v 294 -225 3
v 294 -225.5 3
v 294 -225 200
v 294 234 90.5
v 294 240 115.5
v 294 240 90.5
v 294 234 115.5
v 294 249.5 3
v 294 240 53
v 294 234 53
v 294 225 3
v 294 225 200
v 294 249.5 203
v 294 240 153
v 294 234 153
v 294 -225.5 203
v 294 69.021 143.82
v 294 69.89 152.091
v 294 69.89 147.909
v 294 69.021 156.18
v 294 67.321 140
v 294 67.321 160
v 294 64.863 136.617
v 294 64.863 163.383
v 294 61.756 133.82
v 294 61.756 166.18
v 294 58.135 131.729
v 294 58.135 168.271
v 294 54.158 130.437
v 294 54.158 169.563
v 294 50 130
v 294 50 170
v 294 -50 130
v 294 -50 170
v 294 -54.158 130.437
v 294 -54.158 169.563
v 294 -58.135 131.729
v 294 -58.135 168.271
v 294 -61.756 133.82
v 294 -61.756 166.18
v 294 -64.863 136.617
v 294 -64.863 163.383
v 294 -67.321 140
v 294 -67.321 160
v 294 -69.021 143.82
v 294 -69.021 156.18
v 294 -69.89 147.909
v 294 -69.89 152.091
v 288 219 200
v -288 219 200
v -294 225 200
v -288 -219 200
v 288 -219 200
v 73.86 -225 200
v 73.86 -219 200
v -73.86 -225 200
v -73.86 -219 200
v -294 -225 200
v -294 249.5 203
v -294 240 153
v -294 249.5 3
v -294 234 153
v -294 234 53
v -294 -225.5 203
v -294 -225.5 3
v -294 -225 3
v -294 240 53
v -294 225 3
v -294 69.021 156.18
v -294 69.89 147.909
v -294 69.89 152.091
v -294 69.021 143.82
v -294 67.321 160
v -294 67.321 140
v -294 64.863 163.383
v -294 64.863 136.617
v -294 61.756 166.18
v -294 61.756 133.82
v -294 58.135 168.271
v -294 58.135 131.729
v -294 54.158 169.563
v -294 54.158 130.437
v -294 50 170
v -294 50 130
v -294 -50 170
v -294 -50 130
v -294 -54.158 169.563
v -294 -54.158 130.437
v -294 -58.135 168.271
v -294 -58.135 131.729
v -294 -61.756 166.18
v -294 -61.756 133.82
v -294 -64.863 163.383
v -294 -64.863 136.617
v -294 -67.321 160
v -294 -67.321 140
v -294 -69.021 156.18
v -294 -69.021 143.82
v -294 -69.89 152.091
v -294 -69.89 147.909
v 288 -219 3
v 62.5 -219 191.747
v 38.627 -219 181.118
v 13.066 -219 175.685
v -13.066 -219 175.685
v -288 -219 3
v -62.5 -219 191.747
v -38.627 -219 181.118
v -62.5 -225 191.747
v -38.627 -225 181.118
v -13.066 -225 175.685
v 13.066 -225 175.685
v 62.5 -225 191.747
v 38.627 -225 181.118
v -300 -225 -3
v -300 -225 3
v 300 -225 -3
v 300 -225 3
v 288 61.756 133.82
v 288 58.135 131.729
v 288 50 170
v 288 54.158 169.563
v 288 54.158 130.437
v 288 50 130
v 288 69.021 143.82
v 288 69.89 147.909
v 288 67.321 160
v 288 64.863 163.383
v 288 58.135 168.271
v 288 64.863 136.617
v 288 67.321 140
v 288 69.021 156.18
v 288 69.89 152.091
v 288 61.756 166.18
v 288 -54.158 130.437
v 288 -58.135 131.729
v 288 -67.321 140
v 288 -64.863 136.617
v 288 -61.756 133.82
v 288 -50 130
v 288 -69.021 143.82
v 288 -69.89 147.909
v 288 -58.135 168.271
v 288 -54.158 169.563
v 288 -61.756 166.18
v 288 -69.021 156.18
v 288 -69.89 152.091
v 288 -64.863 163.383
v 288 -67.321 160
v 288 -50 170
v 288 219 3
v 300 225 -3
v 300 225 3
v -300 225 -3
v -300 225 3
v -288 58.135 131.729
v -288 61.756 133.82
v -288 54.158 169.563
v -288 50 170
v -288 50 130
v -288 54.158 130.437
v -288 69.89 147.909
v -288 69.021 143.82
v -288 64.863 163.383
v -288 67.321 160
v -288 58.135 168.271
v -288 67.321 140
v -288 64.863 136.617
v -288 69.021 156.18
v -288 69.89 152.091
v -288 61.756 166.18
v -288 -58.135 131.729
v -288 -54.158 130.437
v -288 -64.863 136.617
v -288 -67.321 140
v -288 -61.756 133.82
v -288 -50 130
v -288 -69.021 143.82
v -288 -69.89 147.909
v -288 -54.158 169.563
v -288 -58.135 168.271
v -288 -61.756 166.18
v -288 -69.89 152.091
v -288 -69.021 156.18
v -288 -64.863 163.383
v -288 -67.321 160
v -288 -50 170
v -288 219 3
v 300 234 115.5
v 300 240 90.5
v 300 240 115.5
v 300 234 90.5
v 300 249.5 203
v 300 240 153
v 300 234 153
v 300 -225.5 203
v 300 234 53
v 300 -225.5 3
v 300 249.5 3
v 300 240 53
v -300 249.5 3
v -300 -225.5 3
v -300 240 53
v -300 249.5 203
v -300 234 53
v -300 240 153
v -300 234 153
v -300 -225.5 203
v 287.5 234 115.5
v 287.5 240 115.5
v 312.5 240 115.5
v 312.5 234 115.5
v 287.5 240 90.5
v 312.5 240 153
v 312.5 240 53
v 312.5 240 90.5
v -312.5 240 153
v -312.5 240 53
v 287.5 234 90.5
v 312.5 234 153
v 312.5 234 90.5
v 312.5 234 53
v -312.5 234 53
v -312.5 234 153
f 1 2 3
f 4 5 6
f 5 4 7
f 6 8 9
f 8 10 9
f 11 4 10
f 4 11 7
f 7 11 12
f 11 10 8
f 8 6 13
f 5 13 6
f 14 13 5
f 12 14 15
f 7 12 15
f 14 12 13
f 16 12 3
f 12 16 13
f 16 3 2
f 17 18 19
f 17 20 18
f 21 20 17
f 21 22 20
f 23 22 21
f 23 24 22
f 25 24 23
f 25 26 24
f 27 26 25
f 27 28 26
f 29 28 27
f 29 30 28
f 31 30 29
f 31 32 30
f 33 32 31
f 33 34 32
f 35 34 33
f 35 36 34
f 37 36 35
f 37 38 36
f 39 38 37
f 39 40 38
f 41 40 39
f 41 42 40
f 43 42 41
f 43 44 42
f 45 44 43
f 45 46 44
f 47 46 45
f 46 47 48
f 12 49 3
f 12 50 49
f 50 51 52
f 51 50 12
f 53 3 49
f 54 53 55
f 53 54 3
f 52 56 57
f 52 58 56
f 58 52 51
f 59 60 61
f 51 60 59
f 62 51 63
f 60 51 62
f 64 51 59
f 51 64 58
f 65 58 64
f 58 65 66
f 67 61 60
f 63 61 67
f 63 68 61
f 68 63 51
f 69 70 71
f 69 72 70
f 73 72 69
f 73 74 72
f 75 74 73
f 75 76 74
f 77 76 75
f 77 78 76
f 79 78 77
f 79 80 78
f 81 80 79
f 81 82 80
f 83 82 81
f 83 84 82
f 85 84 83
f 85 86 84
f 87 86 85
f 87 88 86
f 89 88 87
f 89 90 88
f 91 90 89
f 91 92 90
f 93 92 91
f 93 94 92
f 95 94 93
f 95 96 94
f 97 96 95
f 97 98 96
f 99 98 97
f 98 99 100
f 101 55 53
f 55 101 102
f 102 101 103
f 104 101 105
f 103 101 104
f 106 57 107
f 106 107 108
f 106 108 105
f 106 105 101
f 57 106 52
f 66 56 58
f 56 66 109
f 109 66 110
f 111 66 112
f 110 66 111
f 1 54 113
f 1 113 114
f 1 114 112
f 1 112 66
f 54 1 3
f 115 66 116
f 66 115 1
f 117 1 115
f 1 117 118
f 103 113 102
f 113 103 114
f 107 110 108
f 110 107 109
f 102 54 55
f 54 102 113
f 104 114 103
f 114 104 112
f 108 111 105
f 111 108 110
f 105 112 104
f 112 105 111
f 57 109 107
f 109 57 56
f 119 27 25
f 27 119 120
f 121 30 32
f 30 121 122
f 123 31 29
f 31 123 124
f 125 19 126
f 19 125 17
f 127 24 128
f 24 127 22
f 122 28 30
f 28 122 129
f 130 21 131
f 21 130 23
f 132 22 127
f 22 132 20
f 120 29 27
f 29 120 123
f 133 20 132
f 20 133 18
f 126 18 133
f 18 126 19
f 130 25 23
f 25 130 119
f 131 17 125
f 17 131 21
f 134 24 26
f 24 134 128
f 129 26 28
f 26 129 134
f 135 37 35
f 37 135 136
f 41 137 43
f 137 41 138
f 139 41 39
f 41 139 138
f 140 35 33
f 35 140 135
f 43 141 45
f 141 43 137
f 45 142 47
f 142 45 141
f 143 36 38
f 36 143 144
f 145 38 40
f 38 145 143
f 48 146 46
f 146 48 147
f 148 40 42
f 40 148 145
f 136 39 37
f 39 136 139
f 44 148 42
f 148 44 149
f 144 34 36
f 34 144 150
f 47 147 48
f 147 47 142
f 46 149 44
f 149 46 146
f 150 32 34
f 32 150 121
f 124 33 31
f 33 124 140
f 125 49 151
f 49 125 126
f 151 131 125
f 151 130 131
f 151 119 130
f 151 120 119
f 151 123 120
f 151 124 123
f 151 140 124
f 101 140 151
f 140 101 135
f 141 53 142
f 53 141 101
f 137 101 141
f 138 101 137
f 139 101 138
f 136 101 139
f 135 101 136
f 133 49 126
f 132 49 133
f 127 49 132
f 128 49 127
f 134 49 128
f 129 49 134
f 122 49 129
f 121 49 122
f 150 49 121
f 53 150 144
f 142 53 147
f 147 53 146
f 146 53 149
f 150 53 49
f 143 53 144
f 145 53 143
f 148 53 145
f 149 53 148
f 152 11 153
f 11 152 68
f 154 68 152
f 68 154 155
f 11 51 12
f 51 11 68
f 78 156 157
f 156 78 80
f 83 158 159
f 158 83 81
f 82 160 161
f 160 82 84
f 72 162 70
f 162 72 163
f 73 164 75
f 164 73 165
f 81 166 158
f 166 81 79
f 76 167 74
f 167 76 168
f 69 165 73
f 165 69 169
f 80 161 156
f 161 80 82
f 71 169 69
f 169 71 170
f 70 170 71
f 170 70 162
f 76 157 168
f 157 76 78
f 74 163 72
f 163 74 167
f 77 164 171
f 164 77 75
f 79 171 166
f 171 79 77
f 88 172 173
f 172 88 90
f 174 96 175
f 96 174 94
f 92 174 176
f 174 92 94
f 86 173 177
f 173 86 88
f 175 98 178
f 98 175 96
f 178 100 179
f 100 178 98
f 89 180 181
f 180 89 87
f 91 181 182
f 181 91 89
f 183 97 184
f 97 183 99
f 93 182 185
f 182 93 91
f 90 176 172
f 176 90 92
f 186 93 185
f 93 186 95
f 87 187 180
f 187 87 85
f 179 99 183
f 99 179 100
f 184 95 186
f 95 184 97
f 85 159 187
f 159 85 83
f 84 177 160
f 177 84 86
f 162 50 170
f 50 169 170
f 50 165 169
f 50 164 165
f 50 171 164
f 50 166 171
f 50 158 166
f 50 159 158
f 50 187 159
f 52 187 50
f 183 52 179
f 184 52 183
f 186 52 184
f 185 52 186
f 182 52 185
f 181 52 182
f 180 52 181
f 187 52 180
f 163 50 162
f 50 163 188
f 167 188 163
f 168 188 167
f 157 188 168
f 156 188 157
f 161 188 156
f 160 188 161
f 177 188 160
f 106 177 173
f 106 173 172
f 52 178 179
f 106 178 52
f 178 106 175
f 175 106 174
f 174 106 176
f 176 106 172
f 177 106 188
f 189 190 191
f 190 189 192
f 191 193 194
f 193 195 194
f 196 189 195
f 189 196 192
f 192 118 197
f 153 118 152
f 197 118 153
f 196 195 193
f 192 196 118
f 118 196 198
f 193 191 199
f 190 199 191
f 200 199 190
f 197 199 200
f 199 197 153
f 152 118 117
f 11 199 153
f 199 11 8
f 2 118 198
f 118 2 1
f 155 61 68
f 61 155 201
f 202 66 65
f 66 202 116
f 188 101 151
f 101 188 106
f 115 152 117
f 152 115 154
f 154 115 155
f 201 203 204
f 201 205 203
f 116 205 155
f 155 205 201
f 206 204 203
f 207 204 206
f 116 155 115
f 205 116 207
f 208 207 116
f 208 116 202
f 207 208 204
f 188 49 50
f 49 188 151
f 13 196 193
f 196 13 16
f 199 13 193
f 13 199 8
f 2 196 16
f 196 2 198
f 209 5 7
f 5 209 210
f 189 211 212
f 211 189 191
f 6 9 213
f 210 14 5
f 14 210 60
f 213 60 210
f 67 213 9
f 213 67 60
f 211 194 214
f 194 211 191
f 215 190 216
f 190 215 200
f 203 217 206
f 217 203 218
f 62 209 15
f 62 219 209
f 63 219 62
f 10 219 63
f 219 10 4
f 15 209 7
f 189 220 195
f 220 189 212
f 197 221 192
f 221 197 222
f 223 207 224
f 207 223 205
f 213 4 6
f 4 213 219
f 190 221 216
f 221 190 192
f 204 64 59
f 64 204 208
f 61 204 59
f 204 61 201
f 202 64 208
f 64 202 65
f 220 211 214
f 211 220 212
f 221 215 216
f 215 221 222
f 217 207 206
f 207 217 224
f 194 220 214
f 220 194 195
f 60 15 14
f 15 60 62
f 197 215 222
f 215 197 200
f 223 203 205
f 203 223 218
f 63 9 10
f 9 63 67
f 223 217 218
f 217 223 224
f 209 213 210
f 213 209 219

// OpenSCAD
module drawer() {
  cube(size=[24*25, 18*25, 6], center=true);
  translate([0, -9*25+3, 4*25]) difference() {
    cube(size=[24*25-12, 6, 8*25], center=true);
    translate([0, 0, 8*25]) rotate([90, 0, 0]) cylinder(r=5*25, h=10, center=true);
  }
  translate([12*25-3-6, 0, 4*25]) difference() {
    cube(size=[6, 18*25, 8*25], center=true);
    translate([0, 0, 2*25]) {
      translate([0, 2*25, 0]) rotate([0, 90, 0]) cylinder(r=20, h=10, center=true);
      translate([0, -2*25, 0]) rotate([0, 90, 0]) cylinder(r=20, h=10, center=true);
      cube(size=[10, 4*25, 40], center=true);
    }
  }
  translate([-(12*25-3-6), 0, 4*25]) difference() {
    cube(size=[6, 18*25, 8*25], center=true);
    translate([0, 0, 2*25]) {
      translate([0, 2*25, 0]) rotate([0, 90, 0]) cylinder(r=20, h=10, center=true);
      translate([0, -2*25, 0]) rotate([0, 90, 0]) cylinder(r=20, h=10, center=true);
      cube(size=[10, 4*25, 40], center=true);
    }
  }
  translate([0, 9*25-3, 4*25]) cube(size=[24*25 - 12, 6, 8*25], center=true);
}

module slide_assembly() {
  translate([12*25-3, 0, 0]) difference() {
    cube(size=[6, 19*25, 8*25], center=true);
    translate([0, 9*25, 25]) cube(size=[7, 6, 25], center=true);
    translate([0, 9*25, -25]) cube(size=[7, 6, 25], center=true);
  }
  translate([-(12*25-3), 0, 0]) difference() {
    cube(size=[6, 19*25, 8*25], center=true);
    translate([0, 9*25, 25]) cube(size=[7, 6, 25], center=true);
    translate([0, 9*25, -25]) cube(size=[7, 6, 25], center=true);
  }
  
  translate([0, 9*25, 0]) difference() {
    cube(size=[25*25, 6, 4*25], center=true);
    translate([12.5*25, 0, 0]) cube(size=[50, 7, 25], center=true);
  }
}

color([128/255, 128/255, 0/255]) {
  drawer();
}

translate([0, 12, 3+4*25]) slide_assembly();
